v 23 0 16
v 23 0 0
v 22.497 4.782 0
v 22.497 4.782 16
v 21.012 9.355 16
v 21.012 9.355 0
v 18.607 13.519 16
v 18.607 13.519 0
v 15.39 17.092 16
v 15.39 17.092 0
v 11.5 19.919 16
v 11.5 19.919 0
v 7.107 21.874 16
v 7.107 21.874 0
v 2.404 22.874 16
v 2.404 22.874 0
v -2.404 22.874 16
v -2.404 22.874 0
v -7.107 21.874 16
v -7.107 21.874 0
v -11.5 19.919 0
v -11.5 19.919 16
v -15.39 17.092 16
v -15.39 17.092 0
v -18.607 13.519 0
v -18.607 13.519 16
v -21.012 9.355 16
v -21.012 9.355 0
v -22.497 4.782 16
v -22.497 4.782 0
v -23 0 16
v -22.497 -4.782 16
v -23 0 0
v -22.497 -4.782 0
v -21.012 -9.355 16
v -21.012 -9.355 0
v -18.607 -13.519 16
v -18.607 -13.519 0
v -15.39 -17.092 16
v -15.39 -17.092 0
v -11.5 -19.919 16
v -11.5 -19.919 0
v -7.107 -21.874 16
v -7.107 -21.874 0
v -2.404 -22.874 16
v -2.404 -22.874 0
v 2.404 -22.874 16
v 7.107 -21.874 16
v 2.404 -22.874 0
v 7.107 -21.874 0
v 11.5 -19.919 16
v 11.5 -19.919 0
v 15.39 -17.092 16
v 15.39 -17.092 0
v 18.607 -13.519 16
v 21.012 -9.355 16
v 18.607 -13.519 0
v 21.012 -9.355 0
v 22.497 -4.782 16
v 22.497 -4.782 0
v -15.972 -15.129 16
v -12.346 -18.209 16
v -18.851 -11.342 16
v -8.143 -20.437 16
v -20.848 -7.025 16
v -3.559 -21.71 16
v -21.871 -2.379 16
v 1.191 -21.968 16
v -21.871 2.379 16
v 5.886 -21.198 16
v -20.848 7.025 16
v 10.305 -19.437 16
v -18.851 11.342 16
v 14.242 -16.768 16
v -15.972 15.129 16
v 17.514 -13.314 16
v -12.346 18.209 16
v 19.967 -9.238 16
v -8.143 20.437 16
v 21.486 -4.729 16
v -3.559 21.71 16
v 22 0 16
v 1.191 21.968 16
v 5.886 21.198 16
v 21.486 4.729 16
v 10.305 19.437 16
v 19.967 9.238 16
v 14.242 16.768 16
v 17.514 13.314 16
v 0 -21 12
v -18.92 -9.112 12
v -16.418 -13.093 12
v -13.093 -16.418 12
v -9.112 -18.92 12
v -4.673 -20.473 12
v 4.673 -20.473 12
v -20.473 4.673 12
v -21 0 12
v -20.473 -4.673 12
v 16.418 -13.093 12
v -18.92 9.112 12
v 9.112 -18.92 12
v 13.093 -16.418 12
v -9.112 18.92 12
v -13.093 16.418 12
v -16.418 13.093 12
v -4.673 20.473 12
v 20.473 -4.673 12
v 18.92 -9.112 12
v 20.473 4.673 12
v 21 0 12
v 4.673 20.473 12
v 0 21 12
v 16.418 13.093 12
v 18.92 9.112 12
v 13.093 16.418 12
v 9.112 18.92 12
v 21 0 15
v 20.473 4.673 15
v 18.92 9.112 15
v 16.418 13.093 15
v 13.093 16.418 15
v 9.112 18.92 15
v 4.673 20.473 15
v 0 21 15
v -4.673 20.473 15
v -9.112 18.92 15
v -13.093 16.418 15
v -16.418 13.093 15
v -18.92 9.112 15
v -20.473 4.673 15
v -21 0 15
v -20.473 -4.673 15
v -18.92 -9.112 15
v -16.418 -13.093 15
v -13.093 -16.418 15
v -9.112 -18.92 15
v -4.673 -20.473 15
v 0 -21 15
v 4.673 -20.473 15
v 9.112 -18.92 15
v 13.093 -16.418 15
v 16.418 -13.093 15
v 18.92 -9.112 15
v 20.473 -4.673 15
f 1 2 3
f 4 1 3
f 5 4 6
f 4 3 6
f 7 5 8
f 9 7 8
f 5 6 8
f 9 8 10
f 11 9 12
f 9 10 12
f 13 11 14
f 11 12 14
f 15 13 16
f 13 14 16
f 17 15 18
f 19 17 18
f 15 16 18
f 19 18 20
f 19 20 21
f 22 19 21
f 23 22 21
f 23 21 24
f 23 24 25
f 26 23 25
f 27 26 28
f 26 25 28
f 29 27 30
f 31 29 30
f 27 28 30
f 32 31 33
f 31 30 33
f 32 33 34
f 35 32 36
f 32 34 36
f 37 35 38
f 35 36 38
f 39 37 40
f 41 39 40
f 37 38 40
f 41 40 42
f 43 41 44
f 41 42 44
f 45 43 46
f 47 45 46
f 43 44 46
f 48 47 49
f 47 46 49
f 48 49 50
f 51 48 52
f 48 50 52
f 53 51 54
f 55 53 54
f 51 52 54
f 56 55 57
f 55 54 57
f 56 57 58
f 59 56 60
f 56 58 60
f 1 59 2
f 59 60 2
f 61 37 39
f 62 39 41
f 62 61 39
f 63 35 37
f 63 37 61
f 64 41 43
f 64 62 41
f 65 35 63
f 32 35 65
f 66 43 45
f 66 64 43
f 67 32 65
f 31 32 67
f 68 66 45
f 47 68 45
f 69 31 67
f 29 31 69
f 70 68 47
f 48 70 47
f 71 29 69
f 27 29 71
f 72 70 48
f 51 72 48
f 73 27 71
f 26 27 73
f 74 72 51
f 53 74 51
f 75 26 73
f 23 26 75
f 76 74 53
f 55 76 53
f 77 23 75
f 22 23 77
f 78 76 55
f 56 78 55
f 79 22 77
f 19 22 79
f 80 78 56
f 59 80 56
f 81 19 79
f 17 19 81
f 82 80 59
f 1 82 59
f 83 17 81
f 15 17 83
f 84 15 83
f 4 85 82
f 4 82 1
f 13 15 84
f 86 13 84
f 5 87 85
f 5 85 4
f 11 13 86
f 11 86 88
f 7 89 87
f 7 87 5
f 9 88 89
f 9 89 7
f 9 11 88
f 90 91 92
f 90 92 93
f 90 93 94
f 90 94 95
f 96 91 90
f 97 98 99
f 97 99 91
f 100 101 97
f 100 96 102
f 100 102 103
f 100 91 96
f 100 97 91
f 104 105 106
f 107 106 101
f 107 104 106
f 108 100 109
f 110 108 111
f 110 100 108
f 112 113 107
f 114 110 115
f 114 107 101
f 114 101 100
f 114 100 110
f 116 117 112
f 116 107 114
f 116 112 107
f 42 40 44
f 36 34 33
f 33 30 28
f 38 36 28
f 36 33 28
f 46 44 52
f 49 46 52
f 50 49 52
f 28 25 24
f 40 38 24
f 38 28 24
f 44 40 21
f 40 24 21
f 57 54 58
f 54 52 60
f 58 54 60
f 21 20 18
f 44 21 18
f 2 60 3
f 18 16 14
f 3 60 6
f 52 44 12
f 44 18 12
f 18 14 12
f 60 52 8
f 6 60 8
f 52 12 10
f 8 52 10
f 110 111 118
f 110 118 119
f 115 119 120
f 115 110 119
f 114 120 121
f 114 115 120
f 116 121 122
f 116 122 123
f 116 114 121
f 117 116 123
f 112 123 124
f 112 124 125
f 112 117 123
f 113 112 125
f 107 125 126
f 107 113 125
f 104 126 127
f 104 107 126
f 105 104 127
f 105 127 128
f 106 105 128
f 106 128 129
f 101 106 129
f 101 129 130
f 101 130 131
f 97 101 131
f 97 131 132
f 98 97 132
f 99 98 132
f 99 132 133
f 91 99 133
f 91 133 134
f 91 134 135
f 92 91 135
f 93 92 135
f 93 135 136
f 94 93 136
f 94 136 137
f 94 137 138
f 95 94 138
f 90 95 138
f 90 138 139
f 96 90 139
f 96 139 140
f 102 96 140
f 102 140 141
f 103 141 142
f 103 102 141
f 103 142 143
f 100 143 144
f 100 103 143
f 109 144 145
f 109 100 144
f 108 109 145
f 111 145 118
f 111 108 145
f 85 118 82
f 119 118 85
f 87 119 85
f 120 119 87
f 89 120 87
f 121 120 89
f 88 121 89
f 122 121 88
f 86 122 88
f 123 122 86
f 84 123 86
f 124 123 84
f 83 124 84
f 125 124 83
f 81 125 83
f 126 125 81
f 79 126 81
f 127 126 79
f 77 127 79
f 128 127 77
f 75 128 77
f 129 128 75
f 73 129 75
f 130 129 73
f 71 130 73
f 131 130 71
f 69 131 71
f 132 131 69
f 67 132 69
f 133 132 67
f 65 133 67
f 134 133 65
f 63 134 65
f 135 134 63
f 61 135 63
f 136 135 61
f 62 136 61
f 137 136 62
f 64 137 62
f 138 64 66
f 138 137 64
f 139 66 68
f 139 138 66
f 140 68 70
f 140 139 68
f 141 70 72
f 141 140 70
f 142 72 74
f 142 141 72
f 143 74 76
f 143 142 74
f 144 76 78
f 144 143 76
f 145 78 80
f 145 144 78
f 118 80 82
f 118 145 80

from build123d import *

# Parameters (mm, degrees)
F0_R     = 21
F1_DEPTH = 12
F2_R     = 23
F2_R_2   = 21
F3_DEPTH = 16
F4_SIZE  = 1


with BuildPart() as f1:
    # F0 (on Top) → F1 (new body)
    with BuildSketch(Plane.XY):
        Circle(F0_R)
    extrude(amount=F1_DEPTH)

    # F2 (on Top) → F3 (join)
    with BuildSketch(Plane.XY):
        Circle(F2_R)
        Circle(F2_R_2, mode=Mode.SUBTRACT)
    extrude(amount=F3_DEPTH)

    # F4
    f4_edges = [f1.edges().sort_by_distance(p)[0] for p in [
        (-21, 0, 16),
    ]]
    chamfer(f4_edges, length=F4_SIZE)


solid = f1.part
